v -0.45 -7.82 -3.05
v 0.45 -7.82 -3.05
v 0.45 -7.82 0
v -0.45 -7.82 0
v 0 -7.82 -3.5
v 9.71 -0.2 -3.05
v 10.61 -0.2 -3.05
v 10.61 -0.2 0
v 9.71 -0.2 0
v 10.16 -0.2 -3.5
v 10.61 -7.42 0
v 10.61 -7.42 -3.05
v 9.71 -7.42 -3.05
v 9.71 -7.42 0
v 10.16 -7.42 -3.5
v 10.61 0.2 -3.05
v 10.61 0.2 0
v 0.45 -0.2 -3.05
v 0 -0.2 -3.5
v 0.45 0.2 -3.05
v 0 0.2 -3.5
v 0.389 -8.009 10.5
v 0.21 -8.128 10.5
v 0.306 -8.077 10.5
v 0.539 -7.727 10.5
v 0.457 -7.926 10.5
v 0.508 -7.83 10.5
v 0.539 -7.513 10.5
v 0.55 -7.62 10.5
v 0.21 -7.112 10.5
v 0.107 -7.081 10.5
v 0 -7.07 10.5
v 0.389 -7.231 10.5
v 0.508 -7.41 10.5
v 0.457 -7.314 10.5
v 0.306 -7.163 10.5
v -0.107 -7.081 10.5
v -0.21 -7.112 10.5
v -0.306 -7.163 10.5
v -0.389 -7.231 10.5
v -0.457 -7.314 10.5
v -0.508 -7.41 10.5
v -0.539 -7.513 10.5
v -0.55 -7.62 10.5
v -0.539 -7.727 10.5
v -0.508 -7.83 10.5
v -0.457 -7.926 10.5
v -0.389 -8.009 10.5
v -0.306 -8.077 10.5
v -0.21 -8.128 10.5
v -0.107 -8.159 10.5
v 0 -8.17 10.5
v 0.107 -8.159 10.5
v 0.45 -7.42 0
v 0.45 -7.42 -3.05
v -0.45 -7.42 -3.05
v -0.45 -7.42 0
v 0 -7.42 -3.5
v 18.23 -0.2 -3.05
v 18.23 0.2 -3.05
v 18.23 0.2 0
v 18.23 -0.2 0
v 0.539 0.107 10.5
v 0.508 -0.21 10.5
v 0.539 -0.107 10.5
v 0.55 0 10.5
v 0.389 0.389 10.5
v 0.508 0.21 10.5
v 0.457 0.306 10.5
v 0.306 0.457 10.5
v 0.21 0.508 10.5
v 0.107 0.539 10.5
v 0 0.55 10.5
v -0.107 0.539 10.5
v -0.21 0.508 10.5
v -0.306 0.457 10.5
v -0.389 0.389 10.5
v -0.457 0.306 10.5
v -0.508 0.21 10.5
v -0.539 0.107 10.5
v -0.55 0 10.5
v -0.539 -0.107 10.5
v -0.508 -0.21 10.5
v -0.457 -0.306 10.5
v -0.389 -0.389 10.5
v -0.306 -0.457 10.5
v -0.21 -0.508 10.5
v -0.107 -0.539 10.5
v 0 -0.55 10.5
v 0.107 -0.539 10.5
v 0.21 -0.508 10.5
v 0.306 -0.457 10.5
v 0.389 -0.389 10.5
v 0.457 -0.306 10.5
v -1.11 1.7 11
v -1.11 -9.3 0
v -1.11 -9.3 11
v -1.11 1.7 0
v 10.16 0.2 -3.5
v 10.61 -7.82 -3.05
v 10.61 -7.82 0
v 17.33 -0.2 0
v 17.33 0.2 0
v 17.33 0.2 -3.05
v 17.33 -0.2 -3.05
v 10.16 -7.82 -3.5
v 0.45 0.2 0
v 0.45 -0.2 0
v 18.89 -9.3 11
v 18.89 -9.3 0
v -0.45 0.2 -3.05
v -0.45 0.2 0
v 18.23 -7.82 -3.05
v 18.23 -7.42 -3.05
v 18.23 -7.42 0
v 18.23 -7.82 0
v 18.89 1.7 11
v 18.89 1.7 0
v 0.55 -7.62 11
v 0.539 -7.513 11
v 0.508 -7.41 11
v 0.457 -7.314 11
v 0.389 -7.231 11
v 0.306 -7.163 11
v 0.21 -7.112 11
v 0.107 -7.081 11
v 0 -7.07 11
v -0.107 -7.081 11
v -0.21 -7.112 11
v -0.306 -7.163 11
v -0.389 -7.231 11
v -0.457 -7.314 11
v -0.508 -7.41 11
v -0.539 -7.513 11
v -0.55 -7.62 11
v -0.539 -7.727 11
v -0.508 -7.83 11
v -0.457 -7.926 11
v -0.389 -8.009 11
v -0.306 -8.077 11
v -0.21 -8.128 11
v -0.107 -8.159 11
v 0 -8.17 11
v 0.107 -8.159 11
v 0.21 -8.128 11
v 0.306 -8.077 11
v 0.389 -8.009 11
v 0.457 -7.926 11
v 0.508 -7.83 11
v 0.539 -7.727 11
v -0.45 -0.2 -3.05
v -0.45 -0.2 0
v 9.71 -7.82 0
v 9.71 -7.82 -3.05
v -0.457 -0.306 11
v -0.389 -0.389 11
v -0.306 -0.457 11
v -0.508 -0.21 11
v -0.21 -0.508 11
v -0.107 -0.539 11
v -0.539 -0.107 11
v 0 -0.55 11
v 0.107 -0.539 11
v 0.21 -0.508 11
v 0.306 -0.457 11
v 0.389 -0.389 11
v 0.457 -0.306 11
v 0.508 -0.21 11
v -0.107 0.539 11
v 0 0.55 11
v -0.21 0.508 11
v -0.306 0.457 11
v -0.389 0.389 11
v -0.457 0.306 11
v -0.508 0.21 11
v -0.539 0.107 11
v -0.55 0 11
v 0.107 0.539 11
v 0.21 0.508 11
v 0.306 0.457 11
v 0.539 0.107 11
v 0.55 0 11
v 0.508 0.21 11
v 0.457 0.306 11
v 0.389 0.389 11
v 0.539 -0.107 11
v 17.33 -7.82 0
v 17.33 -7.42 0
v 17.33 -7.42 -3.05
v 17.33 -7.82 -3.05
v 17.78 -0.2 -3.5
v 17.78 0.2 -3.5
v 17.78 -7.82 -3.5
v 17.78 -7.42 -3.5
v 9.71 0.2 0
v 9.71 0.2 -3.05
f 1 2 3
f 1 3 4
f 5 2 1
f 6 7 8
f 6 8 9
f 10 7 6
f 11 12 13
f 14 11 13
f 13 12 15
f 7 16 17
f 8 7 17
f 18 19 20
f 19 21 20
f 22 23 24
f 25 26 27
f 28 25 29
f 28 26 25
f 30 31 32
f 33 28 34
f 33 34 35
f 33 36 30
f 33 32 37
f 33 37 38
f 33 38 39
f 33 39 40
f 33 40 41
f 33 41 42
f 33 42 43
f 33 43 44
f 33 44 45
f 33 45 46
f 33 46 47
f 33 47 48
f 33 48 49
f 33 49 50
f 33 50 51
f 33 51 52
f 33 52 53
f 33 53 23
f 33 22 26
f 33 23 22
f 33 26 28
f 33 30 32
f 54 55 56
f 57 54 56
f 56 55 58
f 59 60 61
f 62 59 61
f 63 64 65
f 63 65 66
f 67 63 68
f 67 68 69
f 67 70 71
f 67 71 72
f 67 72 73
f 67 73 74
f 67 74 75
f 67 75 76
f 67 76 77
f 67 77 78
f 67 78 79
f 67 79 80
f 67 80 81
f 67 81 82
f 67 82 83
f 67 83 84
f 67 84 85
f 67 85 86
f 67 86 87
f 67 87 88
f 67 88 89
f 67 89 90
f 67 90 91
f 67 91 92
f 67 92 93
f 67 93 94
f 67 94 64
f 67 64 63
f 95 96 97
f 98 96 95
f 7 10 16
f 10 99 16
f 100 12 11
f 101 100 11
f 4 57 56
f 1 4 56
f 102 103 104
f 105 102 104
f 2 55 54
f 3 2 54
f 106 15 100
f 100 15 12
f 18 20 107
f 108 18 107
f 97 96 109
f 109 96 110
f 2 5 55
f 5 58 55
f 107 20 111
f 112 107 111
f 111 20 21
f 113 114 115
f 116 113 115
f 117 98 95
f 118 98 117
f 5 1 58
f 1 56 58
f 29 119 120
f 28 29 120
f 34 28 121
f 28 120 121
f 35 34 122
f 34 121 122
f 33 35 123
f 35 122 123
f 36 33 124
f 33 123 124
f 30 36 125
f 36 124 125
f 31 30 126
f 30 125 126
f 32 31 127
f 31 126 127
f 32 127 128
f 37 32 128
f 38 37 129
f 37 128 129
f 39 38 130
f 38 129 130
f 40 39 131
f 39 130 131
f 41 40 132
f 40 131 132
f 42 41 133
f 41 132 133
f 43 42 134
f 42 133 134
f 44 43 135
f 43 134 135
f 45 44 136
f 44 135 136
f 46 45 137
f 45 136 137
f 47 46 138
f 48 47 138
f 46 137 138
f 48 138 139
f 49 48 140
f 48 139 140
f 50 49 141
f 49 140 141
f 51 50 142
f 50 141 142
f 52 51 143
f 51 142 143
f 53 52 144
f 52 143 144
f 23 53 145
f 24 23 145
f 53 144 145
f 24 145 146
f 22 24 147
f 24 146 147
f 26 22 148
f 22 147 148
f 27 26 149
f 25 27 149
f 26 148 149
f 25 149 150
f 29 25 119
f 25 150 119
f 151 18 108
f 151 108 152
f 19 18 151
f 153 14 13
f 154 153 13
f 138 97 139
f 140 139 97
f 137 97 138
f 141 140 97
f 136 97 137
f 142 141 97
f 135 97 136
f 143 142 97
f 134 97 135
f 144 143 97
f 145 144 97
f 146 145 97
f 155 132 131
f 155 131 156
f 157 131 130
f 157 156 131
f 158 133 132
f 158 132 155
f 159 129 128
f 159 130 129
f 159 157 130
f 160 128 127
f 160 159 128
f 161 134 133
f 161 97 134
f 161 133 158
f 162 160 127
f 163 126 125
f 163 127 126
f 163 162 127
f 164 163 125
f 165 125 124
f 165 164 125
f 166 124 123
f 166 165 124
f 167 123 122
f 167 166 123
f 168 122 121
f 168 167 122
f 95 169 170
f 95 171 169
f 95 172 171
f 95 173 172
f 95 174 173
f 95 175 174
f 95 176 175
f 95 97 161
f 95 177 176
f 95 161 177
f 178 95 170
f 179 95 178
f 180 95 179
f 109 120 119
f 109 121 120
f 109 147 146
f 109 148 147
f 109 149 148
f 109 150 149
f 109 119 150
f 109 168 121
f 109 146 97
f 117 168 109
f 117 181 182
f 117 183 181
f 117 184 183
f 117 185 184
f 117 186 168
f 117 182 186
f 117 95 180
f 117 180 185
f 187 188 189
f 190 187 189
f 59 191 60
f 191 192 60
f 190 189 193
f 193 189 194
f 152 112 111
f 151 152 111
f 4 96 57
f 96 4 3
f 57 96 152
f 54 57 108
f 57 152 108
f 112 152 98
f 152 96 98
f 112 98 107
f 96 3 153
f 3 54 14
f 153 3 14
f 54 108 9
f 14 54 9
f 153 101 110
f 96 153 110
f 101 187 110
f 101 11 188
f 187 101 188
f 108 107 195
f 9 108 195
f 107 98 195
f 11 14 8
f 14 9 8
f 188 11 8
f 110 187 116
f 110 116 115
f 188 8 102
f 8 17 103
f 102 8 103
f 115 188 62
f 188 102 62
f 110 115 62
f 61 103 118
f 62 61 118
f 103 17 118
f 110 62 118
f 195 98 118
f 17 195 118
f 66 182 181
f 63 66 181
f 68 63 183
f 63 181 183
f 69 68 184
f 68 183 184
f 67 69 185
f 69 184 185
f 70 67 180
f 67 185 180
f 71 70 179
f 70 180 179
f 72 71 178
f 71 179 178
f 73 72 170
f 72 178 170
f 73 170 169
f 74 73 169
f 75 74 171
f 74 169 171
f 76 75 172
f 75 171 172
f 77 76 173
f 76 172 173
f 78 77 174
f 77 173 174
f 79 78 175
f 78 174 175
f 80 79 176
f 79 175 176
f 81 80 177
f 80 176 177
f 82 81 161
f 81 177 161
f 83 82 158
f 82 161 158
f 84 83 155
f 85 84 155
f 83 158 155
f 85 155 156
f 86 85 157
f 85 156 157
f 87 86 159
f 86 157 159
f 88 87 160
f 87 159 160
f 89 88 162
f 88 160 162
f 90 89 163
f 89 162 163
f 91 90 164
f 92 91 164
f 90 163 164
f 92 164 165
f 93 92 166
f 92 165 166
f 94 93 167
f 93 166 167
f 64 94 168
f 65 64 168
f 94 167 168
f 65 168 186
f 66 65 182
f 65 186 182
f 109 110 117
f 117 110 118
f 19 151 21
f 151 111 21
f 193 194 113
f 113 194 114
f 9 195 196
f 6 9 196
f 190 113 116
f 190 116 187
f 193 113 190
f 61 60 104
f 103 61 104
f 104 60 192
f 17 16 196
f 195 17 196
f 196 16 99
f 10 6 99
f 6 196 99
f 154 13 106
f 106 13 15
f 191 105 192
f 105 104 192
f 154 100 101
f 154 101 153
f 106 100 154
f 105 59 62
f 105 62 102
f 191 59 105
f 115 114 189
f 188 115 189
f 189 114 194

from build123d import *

# Parameters (mm, degrees)
SKIZZE1_W                       = 20
SKIZZE1_H                       = 11
AUFSATZ_LINEAR_AUSTRAGEN1_DEPTH = 11
SKIZZE2_R                       = 0.55
SCHNITT_LINEAR_AUSTRAGEN1_DEPTH = 0.5
AUFSATZ_LINEAR_AUSTRAGEN2_DEPTH = 0.2
LINEARES_MUSTER1_COUNT          = 2
LINEARES_MUSTER1_PITCH          = 10.16
LINEARES_MUSTER2_COUNT          = 2
LINEARES_MUSTER2_PITCH          = 17.78
LINEARES_MUSTER3_COUNT          = 2
LINEARES_MUSTER3_PITCH          = 7.62
LINEARES_MUSTER3_COPY_1_DEPTH   = 0.2
LINEARES_MUSTER3_COPY_2_DEPTH   = 0.2


with BuildPart() as part:
    # Skizze1 → Aufsatz-Linear austragen1 (new body)
    with BuildSketch(Plane.XY):
        with Locations((8.89, -3.8)):
            Rectangle(SKIZZE1_W, SKIZZE1_H)
    extrude(amount=AUFSATZ_LINEAR_AUSTRAGEN1_DEPTH)

    # Skizze2 → Schnitt-Linear austragen1 (cut)
    with BuildSketch(Plane.XY.offset(11)):
        Circle(SKIZZE2_R)
        with Locations((0, -7.62)):
            Circle(SKIZZE2_R)
    extrude(amount=-SCHNITT_LINEAR_AUSTRAGEN1_DEPTH, mode=Mode.SUBTRACT)

    # Skizze3 → Aufsatz-Linear austragen2 (add, symmetric)
    with BuildSketch(Plane(origin=(0, 0, 0), x_dir=(1, 0, 0), z_dir=(0, 1, 0))):
        Polygon((-0.45, 0), (-0.45, 3.05), (0, 3.5), (0.45, 3.05), (0.45, 0), align=None)
    aufsatz_linear_austragen2 = extrude(amount=AUFSATZ_LINEAR_AUSTRAGEN2_DEPTH, both=True)

    # Lineares Muster1: Aufsatz-Linear austragen2 ×2
    with Locations(*[(i * LINEARES_MUSTER1_PITCH, 0, 0) for i in range(1, LINEARES_MUSTER1_COUNT)]):
        add(aufsatz_linear_austragen2)

    # Lineares Muster2: Aufsatz-Linear austragen2 ×2
    with Locations(*[(i * LINEARES_MUSTER2_PITCH, 0, 0) for i in range(1, LINEARES_MUSTER2_COUNT)]):
        add(aufsatz_linear_austragen2)

    # Lineares Muster3: Aufsatz-Linear austragen2 ×2
    with Locations(*[(0, -i * LINEARES_MUSTER3_PITCH, 0) for i in range(1, LINEARES_MUSTER3_COUNT)]):
        add(aufsatz_linear_austragen2)

    # Lineares Muster3 copy 1 sketch → Lineares Muster3 copy 1 (add, symmetric)
    with BuildSketch(Plane(origin=(10.16, -7.62, 0), x_dir=(1, 0, 0), z_dir=(0, 1, 0))):
        Polygon((-0.45, 0), (-0.45, 3.05), (0, 3.5), (0.45, 3.05), (0.45, 0), align=None)
    extrude(amount=LINEARES_MUSTER3_COPY_1_DEPTH, both=True)

    # Lineares Muster3 copy 2 sketch → Lineares Muster3 copy 2 (add, symmetric)
    with BuildSketch(Plane(origin=(17.78, -7.62, 0), x_dir=(1, 0, 0), z_dir=(0, 1, 0))):
        Polygon((-0.45, 0), (-0.45, 3.05), (0, 3.5), (0.45, 3.05), (0.45, 0), align=None)
    extrude(amount=LINEARES_MUSTER3_COPY_2_DEPTH, both=True)


solid = part.part
